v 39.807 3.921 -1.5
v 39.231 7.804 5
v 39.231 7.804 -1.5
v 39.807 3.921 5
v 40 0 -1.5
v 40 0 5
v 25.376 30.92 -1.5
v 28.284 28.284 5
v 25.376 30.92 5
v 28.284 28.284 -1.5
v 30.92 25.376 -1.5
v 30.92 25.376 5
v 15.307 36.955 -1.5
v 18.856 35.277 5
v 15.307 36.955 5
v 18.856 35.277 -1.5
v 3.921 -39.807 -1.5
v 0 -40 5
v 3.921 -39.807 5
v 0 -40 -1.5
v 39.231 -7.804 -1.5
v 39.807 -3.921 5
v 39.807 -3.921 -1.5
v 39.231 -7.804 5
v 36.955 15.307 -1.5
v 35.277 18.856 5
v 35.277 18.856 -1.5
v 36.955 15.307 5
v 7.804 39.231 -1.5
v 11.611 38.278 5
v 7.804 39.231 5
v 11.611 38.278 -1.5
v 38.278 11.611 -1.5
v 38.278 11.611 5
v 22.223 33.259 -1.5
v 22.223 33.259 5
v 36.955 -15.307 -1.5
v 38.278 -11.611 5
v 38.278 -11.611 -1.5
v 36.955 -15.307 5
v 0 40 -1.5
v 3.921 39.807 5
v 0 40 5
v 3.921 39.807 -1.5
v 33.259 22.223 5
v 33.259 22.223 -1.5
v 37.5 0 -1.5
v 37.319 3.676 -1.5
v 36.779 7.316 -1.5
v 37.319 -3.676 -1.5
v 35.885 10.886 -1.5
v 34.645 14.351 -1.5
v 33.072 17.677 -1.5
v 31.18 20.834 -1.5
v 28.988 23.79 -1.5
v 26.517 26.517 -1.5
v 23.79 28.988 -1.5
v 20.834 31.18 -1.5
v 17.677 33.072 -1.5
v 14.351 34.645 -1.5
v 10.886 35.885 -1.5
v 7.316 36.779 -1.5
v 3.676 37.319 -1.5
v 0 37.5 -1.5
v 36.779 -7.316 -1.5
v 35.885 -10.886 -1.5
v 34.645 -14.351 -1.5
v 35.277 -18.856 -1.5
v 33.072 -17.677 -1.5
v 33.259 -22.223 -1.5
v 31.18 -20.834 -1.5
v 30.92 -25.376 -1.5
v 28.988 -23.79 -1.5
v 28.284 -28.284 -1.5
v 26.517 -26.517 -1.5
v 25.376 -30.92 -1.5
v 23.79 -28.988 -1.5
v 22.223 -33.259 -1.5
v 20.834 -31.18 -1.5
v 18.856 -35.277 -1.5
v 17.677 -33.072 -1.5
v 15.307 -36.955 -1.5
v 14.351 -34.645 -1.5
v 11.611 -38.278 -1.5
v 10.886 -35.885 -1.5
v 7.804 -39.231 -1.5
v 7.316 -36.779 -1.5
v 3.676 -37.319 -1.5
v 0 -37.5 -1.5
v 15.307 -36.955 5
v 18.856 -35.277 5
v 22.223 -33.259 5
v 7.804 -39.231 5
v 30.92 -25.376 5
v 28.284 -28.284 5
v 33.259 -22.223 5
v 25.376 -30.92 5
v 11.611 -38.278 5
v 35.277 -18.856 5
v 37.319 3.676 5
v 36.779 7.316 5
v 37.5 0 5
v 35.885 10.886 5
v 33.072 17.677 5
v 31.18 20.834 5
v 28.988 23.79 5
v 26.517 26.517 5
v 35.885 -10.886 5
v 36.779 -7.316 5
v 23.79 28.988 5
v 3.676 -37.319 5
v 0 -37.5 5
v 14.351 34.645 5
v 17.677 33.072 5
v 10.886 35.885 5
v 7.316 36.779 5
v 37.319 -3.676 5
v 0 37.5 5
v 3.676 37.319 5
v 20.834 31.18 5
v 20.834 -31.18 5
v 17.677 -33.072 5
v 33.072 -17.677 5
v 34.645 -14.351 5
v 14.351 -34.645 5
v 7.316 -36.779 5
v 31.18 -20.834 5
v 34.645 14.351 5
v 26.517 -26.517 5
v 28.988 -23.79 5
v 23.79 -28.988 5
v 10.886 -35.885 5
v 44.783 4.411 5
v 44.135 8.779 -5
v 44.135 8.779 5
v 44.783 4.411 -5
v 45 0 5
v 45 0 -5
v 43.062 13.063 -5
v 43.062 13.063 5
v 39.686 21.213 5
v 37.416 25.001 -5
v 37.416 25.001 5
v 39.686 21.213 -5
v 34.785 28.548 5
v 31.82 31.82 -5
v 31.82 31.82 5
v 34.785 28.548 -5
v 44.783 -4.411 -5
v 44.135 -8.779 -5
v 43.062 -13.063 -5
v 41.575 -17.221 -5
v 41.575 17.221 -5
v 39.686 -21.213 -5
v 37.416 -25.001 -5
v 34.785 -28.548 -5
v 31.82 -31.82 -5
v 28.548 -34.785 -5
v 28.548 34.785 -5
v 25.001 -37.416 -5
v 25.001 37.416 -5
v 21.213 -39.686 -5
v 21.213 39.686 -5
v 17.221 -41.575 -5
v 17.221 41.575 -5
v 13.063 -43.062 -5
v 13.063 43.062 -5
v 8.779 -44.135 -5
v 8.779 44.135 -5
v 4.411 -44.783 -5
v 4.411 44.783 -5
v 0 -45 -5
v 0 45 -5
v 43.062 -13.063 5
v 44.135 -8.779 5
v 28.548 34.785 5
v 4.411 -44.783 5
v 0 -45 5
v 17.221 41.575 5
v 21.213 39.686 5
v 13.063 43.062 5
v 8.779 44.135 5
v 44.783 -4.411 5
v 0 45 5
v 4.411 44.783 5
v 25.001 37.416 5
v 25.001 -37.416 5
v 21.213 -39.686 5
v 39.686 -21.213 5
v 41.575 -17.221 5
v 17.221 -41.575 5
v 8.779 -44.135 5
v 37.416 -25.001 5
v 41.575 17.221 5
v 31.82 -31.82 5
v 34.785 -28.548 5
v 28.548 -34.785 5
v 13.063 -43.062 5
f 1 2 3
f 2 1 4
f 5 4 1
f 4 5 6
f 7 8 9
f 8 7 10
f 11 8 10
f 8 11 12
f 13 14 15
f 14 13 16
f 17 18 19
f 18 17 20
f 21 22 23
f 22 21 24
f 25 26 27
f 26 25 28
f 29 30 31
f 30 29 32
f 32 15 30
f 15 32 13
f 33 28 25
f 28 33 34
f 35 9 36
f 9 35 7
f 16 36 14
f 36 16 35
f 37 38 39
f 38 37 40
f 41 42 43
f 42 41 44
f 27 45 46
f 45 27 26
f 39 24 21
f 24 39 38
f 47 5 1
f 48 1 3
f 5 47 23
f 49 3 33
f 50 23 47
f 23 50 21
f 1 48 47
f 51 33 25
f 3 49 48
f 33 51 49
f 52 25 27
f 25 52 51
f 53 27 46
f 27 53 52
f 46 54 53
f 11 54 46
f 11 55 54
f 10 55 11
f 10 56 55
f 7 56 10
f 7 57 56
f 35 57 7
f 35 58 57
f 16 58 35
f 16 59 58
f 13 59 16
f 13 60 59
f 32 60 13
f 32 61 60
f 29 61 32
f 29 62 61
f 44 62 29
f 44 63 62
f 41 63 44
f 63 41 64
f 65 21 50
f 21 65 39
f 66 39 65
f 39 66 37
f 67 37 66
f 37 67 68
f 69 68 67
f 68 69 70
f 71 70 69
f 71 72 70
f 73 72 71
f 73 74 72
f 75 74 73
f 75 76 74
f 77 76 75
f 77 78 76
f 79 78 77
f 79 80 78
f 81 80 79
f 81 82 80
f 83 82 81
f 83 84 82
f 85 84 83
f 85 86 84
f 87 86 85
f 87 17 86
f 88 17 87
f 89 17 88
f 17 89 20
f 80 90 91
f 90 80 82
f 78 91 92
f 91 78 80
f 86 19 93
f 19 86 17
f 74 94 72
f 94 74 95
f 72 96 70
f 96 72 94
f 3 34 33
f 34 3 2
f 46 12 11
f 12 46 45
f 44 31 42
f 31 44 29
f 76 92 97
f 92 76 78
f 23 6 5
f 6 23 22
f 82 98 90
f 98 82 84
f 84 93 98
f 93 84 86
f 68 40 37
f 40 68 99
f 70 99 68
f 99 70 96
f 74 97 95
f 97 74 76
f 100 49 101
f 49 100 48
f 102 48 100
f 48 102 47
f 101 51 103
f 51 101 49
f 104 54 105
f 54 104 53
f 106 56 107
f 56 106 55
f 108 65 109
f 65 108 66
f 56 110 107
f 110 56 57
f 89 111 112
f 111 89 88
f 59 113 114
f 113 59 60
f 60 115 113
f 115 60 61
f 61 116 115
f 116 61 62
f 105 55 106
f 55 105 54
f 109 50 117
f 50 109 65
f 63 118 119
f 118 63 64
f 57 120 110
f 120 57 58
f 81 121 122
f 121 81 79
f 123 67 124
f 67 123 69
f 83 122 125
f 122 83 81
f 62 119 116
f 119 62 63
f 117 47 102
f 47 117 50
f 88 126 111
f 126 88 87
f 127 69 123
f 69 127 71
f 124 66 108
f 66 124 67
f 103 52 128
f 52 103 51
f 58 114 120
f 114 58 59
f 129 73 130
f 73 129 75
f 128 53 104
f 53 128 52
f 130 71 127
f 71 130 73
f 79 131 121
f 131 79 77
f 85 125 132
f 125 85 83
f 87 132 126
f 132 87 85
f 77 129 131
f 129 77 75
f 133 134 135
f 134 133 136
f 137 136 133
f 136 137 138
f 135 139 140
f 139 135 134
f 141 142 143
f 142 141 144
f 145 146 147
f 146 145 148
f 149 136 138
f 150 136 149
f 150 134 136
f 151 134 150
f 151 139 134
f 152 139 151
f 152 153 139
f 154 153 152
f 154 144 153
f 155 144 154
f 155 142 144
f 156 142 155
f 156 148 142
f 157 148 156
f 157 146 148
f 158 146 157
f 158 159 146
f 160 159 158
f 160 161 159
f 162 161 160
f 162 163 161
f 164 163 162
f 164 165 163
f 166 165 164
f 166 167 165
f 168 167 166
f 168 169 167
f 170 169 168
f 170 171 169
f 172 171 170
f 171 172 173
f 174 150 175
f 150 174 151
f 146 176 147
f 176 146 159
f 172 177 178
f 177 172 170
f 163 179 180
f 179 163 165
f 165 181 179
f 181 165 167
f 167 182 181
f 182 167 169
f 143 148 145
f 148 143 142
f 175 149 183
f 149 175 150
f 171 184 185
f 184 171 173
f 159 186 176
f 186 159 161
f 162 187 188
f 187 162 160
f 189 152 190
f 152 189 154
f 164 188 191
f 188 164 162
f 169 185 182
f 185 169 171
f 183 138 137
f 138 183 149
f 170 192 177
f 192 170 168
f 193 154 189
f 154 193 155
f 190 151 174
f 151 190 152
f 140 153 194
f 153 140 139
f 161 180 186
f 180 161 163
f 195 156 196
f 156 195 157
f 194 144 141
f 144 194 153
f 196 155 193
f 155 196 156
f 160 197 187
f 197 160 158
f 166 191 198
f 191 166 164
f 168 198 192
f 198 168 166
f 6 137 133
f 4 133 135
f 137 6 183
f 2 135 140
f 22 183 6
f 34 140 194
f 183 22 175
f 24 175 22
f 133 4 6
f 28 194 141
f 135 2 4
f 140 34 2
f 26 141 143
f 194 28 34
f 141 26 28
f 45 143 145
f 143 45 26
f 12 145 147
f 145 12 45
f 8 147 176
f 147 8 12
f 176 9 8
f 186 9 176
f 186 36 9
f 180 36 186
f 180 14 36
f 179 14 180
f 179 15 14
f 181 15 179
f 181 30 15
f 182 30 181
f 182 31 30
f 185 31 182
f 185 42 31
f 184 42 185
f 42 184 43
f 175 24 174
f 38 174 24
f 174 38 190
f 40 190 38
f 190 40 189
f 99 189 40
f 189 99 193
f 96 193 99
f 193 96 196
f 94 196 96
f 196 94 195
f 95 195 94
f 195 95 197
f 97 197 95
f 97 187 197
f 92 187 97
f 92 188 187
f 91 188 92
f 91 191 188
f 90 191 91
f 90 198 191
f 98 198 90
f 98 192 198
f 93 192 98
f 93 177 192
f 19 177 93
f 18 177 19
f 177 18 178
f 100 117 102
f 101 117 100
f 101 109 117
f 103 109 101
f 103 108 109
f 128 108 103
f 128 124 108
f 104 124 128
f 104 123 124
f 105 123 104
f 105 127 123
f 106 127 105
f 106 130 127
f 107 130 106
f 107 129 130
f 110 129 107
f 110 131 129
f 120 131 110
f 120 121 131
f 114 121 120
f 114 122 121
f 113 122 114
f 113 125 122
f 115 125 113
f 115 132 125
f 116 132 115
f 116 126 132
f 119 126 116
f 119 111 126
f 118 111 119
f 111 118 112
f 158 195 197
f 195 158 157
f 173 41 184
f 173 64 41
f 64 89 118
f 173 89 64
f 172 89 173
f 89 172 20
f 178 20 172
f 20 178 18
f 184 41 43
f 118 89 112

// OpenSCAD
// file: test01_1.scad
//Bluetooth speaker 
$fn = 64;
 
//walls(); 

module walls() {   
    difference() { 
        cylinder(d = 80, h = 150, center=true);
        color("red")
        cylinder(d = 80-5, h = 160, center=true);
 }
}
// main file
include <test01_1.scad>;
$fn = 64;


difference() {
  bottom();
  translate([-90/2, 0, 0])
  #cube(90, center=true);
}

module bottom() {
  difference () {
    cylinder(d=90, h=10, center=true);
    translate([0, 0, 150/2+10/4-4])
    walls();
 }
} 
